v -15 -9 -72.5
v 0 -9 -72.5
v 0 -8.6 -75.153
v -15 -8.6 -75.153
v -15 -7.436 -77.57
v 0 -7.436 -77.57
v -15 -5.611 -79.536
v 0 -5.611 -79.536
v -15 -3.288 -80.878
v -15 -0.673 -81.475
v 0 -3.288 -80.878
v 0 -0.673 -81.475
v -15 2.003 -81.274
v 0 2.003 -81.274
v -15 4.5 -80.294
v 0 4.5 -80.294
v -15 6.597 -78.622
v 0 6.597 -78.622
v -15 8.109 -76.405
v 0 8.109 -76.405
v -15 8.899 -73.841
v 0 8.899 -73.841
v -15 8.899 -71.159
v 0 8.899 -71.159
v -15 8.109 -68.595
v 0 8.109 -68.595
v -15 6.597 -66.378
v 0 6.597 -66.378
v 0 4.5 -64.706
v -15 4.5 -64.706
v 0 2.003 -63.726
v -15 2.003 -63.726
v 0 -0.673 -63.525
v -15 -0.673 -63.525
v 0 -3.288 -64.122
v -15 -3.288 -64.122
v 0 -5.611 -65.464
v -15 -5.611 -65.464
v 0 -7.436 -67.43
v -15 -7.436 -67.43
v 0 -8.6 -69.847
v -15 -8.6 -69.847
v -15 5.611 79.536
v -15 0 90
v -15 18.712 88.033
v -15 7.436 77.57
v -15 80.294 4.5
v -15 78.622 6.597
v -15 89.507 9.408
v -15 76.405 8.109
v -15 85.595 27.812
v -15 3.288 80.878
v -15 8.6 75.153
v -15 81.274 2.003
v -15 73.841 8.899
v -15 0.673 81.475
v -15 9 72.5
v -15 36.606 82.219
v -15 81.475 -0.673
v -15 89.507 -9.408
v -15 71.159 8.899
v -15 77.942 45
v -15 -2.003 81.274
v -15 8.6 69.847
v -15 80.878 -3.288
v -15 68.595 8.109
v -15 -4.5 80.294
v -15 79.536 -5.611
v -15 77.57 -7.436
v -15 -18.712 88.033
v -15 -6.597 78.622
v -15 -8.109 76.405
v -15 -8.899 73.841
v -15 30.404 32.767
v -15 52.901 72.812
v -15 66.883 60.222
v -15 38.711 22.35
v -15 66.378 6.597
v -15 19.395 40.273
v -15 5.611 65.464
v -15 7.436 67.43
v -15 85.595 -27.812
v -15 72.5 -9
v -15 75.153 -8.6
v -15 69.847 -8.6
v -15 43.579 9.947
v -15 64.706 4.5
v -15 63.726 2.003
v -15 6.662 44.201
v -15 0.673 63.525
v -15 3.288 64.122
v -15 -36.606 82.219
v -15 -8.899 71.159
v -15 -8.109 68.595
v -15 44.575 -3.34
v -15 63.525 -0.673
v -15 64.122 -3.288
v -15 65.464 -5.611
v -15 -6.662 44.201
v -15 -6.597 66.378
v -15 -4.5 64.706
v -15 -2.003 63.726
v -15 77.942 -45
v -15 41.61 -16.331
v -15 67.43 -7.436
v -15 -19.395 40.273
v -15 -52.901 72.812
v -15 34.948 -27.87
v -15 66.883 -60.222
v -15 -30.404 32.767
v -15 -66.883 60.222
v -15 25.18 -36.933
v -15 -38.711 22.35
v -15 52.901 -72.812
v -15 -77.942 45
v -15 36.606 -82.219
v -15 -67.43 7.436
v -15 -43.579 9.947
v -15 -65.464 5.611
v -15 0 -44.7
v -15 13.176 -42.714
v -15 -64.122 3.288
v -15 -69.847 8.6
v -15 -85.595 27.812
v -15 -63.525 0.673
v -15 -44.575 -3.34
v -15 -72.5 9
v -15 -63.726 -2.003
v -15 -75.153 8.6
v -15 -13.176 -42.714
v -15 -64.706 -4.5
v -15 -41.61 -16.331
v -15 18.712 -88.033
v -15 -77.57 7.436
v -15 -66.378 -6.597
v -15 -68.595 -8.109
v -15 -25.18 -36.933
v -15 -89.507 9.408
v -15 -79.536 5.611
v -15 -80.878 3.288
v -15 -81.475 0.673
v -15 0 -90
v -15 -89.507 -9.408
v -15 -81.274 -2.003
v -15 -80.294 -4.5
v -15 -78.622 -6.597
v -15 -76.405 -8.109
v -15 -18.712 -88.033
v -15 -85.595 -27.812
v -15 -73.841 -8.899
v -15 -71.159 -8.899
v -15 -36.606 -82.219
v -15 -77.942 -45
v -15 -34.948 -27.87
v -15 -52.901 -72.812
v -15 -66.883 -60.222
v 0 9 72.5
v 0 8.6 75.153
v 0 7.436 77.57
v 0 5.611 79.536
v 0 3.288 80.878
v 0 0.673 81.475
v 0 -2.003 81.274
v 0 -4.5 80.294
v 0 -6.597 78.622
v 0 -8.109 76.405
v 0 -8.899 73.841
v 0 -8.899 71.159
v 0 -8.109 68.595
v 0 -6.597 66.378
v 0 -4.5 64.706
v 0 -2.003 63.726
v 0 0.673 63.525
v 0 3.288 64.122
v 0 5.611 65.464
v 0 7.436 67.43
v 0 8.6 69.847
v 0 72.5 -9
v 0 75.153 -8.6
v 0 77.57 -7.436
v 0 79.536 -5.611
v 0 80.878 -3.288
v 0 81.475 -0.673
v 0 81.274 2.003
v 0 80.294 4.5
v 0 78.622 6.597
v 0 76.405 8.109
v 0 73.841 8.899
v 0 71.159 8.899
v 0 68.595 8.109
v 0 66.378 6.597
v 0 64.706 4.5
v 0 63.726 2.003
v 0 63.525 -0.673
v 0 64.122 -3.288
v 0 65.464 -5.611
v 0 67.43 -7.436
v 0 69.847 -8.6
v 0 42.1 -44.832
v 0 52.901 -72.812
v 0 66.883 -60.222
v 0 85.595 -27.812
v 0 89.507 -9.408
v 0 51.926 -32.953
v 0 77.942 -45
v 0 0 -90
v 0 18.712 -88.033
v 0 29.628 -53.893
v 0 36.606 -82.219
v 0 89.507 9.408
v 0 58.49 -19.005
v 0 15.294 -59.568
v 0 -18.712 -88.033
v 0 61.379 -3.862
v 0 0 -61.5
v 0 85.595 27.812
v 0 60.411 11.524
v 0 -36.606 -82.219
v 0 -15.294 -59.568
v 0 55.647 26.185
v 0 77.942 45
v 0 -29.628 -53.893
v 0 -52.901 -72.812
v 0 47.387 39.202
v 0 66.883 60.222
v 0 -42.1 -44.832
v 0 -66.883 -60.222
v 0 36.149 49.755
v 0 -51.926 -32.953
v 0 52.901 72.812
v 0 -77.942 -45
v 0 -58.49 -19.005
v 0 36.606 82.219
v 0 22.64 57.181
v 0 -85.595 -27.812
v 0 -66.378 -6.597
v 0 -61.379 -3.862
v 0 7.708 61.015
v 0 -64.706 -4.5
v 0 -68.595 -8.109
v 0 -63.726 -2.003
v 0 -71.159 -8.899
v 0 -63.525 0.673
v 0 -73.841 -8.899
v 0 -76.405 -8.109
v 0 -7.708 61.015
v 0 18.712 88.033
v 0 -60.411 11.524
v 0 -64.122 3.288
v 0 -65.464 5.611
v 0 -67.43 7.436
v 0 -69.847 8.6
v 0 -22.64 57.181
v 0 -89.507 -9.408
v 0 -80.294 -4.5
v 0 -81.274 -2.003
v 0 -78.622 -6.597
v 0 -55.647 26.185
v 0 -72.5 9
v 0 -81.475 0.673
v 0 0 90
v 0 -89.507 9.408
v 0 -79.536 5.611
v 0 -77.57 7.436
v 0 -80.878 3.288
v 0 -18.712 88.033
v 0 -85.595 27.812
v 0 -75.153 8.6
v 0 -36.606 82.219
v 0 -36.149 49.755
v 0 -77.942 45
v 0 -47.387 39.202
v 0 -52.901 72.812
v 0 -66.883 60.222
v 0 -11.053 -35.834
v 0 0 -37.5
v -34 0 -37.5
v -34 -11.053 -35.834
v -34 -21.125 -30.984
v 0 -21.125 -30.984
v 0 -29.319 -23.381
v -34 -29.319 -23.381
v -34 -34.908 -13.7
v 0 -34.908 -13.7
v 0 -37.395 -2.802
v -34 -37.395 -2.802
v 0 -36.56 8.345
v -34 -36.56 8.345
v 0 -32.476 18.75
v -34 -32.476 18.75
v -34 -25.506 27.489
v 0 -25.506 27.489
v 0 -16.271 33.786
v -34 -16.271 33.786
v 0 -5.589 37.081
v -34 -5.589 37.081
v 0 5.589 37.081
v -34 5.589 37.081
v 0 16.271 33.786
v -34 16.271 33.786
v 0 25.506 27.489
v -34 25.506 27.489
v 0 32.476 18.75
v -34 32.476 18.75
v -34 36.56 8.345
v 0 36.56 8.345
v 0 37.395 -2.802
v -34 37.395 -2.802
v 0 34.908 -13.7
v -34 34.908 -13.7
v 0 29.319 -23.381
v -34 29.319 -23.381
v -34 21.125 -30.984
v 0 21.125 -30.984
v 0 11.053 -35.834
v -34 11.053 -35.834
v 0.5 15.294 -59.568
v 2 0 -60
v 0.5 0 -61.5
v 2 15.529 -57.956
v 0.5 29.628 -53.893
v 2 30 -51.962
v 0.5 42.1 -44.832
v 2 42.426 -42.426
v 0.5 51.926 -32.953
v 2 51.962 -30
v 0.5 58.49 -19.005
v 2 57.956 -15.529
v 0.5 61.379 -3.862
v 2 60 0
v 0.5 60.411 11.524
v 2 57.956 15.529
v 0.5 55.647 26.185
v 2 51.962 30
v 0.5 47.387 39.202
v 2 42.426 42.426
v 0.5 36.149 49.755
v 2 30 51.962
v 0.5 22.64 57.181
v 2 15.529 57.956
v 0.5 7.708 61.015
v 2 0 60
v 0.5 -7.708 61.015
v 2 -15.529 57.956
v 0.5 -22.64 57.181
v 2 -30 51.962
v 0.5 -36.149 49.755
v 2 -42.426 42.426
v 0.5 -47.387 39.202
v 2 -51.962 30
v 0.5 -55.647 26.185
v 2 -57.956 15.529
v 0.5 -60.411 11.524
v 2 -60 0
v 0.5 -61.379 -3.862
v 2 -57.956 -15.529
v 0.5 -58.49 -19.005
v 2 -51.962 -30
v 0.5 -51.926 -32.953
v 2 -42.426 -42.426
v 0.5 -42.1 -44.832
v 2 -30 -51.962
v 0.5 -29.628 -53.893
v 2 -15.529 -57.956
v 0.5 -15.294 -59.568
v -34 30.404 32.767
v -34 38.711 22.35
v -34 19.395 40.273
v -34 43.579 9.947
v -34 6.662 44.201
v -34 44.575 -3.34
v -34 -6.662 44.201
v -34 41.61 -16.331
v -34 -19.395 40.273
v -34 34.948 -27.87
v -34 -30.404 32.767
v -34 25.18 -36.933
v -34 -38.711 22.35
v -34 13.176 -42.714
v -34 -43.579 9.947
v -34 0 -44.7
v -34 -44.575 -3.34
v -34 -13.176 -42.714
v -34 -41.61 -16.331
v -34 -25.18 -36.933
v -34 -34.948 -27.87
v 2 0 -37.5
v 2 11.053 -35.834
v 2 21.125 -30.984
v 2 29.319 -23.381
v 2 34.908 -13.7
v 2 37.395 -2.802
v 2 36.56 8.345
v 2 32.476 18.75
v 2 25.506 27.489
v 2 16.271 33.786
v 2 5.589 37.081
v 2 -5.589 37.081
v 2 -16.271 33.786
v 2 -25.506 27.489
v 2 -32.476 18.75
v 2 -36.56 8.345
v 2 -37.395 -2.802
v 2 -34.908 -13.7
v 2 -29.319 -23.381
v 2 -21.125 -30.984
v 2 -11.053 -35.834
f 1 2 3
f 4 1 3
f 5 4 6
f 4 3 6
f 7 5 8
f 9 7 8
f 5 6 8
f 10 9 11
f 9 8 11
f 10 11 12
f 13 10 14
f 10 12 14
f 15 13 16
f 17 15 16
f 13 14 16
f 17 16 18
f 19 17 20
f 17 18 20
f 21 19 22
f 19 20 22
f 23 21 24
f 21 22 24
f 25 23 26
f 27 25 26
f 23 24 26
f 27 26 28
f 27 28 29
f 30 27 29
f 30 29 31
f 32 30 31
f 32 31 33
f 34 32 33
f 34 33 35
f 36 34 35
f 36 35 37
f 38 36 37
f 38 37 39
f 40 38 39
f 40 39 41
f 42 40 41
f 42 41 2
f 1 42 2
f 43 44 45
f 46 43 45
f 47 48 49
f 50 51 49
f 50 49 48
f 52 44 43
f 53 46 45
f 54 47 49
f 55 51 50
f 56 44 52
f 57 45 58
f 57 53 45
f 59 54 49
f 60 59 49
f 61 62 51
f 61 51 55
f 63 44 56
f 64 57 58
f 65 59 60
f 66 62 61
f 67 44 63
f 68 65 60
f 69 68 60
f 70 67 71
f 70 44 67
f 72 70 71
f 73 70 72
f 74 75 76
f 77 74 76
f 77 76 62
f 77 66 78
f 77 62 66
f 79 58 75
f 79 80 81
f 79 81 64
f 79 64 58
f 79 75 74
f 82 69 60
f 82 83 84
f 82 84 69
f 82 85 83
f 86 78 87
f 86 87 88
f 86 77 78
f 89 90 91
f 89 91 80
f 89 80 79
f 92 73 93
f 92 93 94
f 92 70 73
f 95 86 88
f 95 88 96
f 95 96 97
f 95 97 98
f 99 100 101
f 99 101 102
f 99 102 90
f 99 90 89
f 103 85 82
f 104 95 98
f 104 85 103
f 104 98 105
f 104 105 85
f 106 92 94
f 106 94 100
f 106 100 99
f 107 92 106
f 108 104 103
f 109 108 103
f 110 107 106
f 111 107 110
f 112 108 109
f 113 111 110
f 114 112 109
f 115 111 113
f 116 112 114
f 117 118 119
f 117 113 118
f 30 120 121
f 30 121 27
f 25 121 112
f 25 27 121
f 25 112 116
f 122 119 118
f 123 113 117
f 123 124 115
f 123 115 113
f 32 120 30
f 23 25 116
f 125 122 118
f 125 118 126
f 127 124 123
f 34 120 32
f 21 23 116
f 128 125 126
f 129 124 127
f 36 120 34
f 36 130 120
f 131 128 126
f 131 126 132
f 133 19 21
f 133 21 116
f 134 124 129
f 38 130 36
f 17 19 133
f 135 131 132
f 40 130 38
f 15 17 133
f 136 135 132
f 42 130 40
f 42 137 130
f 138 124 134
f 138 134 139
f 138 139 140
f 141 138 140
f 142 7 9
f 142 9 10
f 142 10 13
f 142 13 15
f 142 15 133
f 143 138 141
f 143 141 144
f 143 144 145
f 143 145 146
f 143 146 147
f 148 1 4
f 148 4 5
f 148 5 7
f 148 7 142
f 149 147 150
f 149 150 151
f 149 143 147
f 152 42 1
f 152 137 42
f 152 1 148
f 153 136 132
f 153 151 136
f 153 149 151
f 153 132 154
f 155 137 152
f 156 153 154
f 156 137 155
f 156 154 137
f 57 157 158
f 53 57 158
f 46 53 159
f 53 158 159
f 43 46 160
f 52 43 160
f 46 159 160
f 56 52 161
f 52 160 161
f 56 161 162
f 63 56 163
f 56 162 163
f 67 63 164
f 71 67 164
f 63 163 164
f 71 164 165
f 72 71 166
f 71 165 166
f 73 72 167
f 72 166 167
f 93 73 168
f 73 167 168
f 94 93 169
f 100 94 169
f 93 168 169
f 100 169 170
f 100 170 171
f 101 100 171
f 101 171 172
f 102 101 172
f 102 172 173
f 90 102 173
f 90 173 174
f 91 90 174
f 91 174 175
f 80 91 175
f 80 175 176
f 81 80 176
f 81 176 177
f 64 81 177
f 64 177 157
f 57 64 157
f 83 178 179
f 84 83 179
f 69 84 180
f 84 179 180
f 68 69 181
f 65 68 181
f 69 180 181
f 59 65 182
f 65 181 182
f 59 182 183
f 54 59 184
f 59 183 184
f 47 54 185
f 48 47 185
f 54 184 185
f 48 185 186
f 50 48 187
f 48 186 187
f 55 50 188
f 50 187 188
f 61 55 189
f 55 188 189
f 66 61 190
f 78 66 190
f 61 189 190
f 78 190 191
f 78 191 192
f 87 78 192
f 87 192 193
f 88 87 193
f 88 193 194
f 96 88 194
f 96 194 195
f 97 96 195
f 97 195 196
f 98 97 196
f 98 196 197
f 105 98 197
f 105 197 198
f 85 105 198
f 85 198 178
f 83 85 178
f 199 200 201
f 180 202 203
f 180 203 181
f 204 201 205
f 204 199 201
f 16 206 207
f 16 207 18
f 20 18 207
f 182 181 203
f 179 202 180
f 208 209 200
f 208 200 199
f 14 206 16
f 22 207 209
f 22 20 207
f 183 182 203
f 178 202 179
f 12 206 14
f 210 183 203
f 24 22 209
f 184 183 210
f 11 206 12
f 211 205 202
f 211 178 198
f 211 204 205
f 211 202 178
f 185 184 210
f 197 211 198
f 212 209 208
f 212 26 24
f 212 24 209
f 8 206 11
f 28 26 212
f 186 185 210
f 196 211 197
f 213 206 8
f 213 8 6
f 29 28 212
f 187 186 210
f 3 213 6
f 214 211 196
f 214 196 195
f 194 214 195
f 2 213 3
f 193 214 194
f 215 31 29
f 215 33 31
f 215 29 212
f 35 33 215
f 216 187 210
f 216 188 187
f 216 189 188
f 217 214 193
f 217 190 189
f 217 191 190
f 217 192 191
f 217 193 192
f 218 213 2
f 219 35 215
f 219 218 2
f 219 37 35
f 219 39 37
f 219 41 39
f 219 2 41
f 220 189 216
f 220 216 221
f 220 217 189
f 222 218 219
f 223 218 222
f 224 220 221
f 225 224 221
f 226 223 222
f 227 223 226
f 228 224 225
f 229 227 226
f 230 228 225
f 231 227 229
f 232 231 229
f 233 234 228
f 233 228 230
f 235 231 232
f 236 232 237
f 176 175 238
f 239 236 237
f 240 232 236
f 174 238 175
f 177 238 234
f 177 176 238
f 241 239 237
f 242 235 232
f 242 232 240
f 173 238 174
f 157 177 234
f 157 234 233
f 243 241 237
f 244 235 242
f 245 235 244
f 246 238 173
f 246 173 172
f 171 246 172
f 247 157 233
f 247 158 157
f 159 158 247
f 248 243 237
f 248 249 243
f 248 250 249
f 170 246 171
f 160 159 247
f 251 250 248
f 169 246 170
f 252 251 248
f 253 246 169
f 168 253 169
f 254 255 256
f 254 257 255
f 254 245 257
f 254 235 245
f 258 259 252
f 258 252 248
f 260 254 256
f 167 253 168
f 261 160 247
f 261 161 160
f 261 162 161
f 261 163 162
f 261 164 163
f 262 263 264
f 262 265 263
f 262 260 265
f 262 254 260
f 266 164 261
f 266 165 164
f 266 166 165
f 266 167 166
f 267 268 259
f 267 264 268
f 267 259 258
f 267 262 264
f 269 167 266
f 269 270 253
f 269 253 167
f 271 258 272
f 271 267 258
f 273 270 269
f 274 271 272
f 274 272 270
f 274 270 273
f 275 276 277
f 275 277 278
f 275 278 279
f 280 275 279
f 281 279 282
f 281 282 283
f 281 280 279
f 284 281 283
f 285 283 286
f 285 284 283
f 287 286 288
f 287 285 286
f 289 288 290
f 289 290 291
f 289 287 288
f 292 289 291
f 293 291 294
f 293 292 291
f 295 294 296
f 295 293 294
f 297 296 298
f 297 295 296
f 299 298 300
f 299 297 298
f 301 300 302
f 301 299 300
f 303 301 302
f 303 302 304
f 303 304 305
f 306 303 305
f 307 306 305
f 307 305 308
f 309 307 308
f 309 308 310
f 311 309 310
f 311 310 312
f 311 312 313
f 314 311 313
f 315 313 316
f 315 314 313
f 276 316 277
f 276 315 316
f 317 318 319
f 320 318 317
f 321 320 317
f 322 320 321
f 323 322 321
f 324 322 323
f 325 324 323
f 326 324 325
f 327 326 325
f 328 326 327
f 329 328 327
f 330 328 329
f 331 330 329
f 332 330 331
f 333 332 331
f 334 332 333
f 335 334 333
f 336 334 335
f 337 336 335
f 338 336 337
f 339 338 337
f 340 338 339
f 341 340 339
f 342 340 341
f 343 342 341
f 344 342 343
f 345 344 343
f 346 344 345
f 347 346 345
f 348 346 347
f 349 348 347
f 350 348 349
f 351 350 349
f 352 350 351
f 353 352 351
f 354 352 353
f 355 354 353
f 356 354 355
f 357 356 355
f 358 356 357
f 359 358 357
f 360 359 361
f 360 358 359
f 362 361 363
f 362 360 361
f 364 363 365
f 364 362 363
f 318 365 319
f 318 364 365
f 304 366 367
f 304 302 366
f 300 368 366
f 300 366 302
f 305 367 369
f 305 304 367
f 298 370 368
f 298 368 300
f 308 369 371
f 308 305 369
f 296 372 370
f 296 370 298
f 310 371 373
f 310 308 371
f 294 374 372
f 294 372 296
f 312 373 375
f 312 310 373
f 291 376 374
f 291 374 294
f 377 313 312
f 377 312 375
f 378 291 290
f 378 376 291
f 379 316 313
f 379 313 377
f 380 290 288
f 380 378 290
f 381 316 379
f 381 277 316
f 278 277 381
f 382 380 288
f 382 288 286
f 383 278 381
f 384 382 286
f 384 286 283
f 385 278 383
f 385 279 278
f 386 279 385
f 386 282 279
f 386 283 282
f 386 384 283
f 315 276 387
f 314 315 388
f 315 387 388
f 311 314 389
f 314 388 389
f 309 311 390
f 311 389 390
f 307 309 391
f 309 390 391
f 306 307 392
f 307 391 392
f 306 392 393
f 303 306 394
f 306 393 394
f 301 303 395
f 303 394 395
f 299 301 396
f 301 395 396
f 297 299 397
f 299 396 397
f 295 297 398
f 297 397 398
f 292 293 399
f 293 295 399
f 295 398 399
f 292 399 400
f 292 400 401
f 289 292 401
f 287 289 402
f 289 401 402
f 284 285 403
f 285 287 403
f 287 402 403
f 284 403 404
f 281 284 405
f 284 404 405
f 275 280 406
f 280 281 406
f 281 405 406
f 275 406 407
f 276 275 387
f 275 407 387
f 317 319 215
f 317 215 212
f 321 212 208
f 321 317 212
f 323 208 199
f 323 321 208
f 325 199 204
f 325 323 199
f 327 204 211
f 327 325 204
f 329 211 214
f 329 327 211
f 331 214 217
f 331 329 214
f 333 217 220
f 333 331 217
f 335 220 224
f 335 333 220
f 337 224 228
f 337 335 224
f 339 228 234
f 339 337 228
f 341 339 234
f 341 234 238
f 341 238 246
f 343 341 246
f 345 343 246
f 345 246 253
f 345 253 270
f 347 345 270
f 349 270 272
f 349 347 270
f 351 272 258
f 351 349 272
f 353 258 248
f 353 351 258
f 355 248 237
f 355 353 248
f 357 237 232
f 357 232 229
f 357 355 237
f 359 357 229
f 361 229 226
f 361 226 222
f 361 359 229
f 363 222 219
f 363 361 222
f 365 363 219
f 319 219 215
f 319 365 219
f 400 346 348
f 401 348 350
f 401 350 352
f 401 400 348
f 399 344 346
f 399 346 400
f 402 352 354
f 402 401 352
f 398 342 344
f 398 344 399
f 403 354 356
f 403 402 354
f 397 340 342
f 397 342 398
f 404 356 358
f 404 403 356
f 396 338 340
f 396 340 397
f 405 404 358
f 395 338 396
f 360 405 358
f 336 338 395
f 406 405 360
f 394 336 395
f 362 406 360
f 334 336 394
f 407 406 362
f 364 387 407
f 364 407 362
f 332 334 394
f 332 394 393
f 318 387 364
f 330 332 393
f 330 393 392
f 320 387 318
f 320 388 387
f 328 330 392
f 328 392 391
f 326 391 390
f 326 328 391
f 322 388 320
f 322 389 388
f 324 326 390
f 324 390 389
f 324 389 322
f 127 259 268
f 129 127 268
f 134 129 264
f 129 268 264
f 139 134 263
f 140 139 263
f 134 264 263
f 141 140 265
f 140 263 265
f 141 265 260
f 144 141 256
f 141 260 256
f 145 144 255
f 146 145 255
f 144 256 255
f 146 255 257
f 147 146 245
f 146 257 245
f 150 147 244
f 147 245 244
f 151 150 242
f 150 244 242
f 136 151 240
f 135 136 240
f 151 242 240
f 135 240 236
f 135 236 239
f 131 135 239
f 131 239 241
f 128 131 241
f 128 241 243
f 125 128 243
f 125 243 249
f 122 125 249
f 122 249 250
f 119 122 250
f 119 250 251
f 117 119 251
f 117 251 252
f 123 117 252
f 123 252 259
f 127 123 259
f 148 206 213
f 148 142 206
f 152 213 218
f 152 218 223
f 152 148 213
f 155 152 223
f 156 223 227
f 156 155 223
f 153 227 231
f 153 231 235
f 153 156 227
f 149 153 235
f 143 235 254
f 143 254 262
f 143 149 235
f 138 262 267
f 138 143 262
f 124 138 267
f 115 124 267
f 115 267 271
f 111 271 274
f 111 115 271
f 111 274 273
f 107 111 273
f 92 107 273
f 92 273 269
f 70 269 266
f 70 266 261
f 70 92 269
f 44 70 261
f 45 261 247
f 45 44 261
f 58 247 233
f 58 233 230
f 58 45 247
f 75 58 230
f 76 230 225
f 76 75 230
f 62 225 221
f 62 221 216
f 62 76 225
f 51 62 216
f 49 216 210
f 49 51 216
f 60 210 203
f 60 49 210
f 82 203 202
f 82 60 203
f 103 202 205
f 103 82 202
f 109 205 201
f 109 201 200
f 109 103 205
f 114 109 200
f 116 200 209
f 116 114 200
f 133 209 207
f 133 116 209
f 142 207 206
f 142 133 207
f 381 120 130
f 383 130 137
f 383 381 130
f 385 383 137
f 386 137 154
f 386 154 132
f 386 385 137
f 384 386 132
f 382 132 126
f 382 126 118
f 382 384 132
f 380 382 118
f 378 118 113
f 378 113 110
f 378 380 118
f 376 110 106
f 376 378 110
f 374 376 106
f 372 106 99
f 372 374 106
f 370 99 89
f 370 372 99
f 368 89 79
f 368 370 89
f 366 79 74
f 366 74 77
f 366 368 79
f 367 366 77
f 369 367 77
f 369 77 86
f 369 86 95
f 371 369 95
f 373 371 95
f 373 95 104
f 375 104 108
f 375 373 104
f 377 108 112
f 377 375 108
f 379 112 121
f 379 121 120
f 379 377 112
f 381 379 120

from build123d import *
from build123d.topology import SkipClean

# Parameters (mm, degrees)
SKETCH_2_R               = 9
CUT_EXTRUDE_2_DEPTH      = 132.742172443
PATTERN_CIRCULAR_2_COUNT = 4
EXTRUDE_START            = 2
SKETCH_3_R               = 61.5
SKETCH_3_R_2             = 37.5
EXTRUDE_1_DEPTH          = 2
CHAMFER_5_SIZE           = 1.5


with BuildPart() as part:
    # Эскиз1 → Повернуть1 (revolve)
    with BuildSketch(Plane.XY):
        Polygon((-34, 37.5), (0, 37.5), (0, 90), (-15, 90), (-15, 44.7), (-34, 44.7), align=None)
    revolve(axis=Axis((0, 0, 0), (-1, 0, 0)))

    # Эскиз2 → Вырез-Вытянуть2 (cut, through all)
    with BuildSketch(Plane(origin=(0, 0, 0), x_dir=(0, 0, -1), z_dir=(1, 0, 0))):
        with Locations((0, 72.5)):
            Circle(SKETCH_2_R)
    cut_extrude_2 = extrude(amount=-CUT_EXTRUDE_2_DEPTH, mode=Mode.SUBTRACT)

    # Круговой массив2: Вырез-Вытянуть2 ×4 about axis
    pattern_circular_2_axis = Axis((84.004285605, 0, 0), (-1, 0, 0))
    for i in range(1, PATTERN_CIRCULAR_2_COUNT):
        add(cut_extrude_2.rotate(pattern_circular_2_axis, i * 360 / PATTERN_CIRCULAR_2_COUNT), mode=Mode.SUBTRACT)

    # Эскиз3 → Вытянуть1 (add)
    with SkipClean():  # the faces are left unmerged after this step: merging them gives an invalid solid
        with BuildSketch(Plane(origin=(0, 0, 0), x_dir=(0, 0, -1), z_dir=(1, 0, 0)).offset(EXTRUDE_START)):
            Circle(SKETCH_3_R)
            Circle(SKETCH_3_R_2, mode=Mode.SUBTRACT)
        extrude(amount=-EXTRUDE_1_DEPTH)

    # Фаска5
    chamfer_5_edges = [part.edges().sort_by_distance(p)[0] for p in [
        (2, 0, 61.5),
    ]]
    chamfer(chamfer_5_edges, length=CHAMFER_5_SIZE)


solid = part.part
